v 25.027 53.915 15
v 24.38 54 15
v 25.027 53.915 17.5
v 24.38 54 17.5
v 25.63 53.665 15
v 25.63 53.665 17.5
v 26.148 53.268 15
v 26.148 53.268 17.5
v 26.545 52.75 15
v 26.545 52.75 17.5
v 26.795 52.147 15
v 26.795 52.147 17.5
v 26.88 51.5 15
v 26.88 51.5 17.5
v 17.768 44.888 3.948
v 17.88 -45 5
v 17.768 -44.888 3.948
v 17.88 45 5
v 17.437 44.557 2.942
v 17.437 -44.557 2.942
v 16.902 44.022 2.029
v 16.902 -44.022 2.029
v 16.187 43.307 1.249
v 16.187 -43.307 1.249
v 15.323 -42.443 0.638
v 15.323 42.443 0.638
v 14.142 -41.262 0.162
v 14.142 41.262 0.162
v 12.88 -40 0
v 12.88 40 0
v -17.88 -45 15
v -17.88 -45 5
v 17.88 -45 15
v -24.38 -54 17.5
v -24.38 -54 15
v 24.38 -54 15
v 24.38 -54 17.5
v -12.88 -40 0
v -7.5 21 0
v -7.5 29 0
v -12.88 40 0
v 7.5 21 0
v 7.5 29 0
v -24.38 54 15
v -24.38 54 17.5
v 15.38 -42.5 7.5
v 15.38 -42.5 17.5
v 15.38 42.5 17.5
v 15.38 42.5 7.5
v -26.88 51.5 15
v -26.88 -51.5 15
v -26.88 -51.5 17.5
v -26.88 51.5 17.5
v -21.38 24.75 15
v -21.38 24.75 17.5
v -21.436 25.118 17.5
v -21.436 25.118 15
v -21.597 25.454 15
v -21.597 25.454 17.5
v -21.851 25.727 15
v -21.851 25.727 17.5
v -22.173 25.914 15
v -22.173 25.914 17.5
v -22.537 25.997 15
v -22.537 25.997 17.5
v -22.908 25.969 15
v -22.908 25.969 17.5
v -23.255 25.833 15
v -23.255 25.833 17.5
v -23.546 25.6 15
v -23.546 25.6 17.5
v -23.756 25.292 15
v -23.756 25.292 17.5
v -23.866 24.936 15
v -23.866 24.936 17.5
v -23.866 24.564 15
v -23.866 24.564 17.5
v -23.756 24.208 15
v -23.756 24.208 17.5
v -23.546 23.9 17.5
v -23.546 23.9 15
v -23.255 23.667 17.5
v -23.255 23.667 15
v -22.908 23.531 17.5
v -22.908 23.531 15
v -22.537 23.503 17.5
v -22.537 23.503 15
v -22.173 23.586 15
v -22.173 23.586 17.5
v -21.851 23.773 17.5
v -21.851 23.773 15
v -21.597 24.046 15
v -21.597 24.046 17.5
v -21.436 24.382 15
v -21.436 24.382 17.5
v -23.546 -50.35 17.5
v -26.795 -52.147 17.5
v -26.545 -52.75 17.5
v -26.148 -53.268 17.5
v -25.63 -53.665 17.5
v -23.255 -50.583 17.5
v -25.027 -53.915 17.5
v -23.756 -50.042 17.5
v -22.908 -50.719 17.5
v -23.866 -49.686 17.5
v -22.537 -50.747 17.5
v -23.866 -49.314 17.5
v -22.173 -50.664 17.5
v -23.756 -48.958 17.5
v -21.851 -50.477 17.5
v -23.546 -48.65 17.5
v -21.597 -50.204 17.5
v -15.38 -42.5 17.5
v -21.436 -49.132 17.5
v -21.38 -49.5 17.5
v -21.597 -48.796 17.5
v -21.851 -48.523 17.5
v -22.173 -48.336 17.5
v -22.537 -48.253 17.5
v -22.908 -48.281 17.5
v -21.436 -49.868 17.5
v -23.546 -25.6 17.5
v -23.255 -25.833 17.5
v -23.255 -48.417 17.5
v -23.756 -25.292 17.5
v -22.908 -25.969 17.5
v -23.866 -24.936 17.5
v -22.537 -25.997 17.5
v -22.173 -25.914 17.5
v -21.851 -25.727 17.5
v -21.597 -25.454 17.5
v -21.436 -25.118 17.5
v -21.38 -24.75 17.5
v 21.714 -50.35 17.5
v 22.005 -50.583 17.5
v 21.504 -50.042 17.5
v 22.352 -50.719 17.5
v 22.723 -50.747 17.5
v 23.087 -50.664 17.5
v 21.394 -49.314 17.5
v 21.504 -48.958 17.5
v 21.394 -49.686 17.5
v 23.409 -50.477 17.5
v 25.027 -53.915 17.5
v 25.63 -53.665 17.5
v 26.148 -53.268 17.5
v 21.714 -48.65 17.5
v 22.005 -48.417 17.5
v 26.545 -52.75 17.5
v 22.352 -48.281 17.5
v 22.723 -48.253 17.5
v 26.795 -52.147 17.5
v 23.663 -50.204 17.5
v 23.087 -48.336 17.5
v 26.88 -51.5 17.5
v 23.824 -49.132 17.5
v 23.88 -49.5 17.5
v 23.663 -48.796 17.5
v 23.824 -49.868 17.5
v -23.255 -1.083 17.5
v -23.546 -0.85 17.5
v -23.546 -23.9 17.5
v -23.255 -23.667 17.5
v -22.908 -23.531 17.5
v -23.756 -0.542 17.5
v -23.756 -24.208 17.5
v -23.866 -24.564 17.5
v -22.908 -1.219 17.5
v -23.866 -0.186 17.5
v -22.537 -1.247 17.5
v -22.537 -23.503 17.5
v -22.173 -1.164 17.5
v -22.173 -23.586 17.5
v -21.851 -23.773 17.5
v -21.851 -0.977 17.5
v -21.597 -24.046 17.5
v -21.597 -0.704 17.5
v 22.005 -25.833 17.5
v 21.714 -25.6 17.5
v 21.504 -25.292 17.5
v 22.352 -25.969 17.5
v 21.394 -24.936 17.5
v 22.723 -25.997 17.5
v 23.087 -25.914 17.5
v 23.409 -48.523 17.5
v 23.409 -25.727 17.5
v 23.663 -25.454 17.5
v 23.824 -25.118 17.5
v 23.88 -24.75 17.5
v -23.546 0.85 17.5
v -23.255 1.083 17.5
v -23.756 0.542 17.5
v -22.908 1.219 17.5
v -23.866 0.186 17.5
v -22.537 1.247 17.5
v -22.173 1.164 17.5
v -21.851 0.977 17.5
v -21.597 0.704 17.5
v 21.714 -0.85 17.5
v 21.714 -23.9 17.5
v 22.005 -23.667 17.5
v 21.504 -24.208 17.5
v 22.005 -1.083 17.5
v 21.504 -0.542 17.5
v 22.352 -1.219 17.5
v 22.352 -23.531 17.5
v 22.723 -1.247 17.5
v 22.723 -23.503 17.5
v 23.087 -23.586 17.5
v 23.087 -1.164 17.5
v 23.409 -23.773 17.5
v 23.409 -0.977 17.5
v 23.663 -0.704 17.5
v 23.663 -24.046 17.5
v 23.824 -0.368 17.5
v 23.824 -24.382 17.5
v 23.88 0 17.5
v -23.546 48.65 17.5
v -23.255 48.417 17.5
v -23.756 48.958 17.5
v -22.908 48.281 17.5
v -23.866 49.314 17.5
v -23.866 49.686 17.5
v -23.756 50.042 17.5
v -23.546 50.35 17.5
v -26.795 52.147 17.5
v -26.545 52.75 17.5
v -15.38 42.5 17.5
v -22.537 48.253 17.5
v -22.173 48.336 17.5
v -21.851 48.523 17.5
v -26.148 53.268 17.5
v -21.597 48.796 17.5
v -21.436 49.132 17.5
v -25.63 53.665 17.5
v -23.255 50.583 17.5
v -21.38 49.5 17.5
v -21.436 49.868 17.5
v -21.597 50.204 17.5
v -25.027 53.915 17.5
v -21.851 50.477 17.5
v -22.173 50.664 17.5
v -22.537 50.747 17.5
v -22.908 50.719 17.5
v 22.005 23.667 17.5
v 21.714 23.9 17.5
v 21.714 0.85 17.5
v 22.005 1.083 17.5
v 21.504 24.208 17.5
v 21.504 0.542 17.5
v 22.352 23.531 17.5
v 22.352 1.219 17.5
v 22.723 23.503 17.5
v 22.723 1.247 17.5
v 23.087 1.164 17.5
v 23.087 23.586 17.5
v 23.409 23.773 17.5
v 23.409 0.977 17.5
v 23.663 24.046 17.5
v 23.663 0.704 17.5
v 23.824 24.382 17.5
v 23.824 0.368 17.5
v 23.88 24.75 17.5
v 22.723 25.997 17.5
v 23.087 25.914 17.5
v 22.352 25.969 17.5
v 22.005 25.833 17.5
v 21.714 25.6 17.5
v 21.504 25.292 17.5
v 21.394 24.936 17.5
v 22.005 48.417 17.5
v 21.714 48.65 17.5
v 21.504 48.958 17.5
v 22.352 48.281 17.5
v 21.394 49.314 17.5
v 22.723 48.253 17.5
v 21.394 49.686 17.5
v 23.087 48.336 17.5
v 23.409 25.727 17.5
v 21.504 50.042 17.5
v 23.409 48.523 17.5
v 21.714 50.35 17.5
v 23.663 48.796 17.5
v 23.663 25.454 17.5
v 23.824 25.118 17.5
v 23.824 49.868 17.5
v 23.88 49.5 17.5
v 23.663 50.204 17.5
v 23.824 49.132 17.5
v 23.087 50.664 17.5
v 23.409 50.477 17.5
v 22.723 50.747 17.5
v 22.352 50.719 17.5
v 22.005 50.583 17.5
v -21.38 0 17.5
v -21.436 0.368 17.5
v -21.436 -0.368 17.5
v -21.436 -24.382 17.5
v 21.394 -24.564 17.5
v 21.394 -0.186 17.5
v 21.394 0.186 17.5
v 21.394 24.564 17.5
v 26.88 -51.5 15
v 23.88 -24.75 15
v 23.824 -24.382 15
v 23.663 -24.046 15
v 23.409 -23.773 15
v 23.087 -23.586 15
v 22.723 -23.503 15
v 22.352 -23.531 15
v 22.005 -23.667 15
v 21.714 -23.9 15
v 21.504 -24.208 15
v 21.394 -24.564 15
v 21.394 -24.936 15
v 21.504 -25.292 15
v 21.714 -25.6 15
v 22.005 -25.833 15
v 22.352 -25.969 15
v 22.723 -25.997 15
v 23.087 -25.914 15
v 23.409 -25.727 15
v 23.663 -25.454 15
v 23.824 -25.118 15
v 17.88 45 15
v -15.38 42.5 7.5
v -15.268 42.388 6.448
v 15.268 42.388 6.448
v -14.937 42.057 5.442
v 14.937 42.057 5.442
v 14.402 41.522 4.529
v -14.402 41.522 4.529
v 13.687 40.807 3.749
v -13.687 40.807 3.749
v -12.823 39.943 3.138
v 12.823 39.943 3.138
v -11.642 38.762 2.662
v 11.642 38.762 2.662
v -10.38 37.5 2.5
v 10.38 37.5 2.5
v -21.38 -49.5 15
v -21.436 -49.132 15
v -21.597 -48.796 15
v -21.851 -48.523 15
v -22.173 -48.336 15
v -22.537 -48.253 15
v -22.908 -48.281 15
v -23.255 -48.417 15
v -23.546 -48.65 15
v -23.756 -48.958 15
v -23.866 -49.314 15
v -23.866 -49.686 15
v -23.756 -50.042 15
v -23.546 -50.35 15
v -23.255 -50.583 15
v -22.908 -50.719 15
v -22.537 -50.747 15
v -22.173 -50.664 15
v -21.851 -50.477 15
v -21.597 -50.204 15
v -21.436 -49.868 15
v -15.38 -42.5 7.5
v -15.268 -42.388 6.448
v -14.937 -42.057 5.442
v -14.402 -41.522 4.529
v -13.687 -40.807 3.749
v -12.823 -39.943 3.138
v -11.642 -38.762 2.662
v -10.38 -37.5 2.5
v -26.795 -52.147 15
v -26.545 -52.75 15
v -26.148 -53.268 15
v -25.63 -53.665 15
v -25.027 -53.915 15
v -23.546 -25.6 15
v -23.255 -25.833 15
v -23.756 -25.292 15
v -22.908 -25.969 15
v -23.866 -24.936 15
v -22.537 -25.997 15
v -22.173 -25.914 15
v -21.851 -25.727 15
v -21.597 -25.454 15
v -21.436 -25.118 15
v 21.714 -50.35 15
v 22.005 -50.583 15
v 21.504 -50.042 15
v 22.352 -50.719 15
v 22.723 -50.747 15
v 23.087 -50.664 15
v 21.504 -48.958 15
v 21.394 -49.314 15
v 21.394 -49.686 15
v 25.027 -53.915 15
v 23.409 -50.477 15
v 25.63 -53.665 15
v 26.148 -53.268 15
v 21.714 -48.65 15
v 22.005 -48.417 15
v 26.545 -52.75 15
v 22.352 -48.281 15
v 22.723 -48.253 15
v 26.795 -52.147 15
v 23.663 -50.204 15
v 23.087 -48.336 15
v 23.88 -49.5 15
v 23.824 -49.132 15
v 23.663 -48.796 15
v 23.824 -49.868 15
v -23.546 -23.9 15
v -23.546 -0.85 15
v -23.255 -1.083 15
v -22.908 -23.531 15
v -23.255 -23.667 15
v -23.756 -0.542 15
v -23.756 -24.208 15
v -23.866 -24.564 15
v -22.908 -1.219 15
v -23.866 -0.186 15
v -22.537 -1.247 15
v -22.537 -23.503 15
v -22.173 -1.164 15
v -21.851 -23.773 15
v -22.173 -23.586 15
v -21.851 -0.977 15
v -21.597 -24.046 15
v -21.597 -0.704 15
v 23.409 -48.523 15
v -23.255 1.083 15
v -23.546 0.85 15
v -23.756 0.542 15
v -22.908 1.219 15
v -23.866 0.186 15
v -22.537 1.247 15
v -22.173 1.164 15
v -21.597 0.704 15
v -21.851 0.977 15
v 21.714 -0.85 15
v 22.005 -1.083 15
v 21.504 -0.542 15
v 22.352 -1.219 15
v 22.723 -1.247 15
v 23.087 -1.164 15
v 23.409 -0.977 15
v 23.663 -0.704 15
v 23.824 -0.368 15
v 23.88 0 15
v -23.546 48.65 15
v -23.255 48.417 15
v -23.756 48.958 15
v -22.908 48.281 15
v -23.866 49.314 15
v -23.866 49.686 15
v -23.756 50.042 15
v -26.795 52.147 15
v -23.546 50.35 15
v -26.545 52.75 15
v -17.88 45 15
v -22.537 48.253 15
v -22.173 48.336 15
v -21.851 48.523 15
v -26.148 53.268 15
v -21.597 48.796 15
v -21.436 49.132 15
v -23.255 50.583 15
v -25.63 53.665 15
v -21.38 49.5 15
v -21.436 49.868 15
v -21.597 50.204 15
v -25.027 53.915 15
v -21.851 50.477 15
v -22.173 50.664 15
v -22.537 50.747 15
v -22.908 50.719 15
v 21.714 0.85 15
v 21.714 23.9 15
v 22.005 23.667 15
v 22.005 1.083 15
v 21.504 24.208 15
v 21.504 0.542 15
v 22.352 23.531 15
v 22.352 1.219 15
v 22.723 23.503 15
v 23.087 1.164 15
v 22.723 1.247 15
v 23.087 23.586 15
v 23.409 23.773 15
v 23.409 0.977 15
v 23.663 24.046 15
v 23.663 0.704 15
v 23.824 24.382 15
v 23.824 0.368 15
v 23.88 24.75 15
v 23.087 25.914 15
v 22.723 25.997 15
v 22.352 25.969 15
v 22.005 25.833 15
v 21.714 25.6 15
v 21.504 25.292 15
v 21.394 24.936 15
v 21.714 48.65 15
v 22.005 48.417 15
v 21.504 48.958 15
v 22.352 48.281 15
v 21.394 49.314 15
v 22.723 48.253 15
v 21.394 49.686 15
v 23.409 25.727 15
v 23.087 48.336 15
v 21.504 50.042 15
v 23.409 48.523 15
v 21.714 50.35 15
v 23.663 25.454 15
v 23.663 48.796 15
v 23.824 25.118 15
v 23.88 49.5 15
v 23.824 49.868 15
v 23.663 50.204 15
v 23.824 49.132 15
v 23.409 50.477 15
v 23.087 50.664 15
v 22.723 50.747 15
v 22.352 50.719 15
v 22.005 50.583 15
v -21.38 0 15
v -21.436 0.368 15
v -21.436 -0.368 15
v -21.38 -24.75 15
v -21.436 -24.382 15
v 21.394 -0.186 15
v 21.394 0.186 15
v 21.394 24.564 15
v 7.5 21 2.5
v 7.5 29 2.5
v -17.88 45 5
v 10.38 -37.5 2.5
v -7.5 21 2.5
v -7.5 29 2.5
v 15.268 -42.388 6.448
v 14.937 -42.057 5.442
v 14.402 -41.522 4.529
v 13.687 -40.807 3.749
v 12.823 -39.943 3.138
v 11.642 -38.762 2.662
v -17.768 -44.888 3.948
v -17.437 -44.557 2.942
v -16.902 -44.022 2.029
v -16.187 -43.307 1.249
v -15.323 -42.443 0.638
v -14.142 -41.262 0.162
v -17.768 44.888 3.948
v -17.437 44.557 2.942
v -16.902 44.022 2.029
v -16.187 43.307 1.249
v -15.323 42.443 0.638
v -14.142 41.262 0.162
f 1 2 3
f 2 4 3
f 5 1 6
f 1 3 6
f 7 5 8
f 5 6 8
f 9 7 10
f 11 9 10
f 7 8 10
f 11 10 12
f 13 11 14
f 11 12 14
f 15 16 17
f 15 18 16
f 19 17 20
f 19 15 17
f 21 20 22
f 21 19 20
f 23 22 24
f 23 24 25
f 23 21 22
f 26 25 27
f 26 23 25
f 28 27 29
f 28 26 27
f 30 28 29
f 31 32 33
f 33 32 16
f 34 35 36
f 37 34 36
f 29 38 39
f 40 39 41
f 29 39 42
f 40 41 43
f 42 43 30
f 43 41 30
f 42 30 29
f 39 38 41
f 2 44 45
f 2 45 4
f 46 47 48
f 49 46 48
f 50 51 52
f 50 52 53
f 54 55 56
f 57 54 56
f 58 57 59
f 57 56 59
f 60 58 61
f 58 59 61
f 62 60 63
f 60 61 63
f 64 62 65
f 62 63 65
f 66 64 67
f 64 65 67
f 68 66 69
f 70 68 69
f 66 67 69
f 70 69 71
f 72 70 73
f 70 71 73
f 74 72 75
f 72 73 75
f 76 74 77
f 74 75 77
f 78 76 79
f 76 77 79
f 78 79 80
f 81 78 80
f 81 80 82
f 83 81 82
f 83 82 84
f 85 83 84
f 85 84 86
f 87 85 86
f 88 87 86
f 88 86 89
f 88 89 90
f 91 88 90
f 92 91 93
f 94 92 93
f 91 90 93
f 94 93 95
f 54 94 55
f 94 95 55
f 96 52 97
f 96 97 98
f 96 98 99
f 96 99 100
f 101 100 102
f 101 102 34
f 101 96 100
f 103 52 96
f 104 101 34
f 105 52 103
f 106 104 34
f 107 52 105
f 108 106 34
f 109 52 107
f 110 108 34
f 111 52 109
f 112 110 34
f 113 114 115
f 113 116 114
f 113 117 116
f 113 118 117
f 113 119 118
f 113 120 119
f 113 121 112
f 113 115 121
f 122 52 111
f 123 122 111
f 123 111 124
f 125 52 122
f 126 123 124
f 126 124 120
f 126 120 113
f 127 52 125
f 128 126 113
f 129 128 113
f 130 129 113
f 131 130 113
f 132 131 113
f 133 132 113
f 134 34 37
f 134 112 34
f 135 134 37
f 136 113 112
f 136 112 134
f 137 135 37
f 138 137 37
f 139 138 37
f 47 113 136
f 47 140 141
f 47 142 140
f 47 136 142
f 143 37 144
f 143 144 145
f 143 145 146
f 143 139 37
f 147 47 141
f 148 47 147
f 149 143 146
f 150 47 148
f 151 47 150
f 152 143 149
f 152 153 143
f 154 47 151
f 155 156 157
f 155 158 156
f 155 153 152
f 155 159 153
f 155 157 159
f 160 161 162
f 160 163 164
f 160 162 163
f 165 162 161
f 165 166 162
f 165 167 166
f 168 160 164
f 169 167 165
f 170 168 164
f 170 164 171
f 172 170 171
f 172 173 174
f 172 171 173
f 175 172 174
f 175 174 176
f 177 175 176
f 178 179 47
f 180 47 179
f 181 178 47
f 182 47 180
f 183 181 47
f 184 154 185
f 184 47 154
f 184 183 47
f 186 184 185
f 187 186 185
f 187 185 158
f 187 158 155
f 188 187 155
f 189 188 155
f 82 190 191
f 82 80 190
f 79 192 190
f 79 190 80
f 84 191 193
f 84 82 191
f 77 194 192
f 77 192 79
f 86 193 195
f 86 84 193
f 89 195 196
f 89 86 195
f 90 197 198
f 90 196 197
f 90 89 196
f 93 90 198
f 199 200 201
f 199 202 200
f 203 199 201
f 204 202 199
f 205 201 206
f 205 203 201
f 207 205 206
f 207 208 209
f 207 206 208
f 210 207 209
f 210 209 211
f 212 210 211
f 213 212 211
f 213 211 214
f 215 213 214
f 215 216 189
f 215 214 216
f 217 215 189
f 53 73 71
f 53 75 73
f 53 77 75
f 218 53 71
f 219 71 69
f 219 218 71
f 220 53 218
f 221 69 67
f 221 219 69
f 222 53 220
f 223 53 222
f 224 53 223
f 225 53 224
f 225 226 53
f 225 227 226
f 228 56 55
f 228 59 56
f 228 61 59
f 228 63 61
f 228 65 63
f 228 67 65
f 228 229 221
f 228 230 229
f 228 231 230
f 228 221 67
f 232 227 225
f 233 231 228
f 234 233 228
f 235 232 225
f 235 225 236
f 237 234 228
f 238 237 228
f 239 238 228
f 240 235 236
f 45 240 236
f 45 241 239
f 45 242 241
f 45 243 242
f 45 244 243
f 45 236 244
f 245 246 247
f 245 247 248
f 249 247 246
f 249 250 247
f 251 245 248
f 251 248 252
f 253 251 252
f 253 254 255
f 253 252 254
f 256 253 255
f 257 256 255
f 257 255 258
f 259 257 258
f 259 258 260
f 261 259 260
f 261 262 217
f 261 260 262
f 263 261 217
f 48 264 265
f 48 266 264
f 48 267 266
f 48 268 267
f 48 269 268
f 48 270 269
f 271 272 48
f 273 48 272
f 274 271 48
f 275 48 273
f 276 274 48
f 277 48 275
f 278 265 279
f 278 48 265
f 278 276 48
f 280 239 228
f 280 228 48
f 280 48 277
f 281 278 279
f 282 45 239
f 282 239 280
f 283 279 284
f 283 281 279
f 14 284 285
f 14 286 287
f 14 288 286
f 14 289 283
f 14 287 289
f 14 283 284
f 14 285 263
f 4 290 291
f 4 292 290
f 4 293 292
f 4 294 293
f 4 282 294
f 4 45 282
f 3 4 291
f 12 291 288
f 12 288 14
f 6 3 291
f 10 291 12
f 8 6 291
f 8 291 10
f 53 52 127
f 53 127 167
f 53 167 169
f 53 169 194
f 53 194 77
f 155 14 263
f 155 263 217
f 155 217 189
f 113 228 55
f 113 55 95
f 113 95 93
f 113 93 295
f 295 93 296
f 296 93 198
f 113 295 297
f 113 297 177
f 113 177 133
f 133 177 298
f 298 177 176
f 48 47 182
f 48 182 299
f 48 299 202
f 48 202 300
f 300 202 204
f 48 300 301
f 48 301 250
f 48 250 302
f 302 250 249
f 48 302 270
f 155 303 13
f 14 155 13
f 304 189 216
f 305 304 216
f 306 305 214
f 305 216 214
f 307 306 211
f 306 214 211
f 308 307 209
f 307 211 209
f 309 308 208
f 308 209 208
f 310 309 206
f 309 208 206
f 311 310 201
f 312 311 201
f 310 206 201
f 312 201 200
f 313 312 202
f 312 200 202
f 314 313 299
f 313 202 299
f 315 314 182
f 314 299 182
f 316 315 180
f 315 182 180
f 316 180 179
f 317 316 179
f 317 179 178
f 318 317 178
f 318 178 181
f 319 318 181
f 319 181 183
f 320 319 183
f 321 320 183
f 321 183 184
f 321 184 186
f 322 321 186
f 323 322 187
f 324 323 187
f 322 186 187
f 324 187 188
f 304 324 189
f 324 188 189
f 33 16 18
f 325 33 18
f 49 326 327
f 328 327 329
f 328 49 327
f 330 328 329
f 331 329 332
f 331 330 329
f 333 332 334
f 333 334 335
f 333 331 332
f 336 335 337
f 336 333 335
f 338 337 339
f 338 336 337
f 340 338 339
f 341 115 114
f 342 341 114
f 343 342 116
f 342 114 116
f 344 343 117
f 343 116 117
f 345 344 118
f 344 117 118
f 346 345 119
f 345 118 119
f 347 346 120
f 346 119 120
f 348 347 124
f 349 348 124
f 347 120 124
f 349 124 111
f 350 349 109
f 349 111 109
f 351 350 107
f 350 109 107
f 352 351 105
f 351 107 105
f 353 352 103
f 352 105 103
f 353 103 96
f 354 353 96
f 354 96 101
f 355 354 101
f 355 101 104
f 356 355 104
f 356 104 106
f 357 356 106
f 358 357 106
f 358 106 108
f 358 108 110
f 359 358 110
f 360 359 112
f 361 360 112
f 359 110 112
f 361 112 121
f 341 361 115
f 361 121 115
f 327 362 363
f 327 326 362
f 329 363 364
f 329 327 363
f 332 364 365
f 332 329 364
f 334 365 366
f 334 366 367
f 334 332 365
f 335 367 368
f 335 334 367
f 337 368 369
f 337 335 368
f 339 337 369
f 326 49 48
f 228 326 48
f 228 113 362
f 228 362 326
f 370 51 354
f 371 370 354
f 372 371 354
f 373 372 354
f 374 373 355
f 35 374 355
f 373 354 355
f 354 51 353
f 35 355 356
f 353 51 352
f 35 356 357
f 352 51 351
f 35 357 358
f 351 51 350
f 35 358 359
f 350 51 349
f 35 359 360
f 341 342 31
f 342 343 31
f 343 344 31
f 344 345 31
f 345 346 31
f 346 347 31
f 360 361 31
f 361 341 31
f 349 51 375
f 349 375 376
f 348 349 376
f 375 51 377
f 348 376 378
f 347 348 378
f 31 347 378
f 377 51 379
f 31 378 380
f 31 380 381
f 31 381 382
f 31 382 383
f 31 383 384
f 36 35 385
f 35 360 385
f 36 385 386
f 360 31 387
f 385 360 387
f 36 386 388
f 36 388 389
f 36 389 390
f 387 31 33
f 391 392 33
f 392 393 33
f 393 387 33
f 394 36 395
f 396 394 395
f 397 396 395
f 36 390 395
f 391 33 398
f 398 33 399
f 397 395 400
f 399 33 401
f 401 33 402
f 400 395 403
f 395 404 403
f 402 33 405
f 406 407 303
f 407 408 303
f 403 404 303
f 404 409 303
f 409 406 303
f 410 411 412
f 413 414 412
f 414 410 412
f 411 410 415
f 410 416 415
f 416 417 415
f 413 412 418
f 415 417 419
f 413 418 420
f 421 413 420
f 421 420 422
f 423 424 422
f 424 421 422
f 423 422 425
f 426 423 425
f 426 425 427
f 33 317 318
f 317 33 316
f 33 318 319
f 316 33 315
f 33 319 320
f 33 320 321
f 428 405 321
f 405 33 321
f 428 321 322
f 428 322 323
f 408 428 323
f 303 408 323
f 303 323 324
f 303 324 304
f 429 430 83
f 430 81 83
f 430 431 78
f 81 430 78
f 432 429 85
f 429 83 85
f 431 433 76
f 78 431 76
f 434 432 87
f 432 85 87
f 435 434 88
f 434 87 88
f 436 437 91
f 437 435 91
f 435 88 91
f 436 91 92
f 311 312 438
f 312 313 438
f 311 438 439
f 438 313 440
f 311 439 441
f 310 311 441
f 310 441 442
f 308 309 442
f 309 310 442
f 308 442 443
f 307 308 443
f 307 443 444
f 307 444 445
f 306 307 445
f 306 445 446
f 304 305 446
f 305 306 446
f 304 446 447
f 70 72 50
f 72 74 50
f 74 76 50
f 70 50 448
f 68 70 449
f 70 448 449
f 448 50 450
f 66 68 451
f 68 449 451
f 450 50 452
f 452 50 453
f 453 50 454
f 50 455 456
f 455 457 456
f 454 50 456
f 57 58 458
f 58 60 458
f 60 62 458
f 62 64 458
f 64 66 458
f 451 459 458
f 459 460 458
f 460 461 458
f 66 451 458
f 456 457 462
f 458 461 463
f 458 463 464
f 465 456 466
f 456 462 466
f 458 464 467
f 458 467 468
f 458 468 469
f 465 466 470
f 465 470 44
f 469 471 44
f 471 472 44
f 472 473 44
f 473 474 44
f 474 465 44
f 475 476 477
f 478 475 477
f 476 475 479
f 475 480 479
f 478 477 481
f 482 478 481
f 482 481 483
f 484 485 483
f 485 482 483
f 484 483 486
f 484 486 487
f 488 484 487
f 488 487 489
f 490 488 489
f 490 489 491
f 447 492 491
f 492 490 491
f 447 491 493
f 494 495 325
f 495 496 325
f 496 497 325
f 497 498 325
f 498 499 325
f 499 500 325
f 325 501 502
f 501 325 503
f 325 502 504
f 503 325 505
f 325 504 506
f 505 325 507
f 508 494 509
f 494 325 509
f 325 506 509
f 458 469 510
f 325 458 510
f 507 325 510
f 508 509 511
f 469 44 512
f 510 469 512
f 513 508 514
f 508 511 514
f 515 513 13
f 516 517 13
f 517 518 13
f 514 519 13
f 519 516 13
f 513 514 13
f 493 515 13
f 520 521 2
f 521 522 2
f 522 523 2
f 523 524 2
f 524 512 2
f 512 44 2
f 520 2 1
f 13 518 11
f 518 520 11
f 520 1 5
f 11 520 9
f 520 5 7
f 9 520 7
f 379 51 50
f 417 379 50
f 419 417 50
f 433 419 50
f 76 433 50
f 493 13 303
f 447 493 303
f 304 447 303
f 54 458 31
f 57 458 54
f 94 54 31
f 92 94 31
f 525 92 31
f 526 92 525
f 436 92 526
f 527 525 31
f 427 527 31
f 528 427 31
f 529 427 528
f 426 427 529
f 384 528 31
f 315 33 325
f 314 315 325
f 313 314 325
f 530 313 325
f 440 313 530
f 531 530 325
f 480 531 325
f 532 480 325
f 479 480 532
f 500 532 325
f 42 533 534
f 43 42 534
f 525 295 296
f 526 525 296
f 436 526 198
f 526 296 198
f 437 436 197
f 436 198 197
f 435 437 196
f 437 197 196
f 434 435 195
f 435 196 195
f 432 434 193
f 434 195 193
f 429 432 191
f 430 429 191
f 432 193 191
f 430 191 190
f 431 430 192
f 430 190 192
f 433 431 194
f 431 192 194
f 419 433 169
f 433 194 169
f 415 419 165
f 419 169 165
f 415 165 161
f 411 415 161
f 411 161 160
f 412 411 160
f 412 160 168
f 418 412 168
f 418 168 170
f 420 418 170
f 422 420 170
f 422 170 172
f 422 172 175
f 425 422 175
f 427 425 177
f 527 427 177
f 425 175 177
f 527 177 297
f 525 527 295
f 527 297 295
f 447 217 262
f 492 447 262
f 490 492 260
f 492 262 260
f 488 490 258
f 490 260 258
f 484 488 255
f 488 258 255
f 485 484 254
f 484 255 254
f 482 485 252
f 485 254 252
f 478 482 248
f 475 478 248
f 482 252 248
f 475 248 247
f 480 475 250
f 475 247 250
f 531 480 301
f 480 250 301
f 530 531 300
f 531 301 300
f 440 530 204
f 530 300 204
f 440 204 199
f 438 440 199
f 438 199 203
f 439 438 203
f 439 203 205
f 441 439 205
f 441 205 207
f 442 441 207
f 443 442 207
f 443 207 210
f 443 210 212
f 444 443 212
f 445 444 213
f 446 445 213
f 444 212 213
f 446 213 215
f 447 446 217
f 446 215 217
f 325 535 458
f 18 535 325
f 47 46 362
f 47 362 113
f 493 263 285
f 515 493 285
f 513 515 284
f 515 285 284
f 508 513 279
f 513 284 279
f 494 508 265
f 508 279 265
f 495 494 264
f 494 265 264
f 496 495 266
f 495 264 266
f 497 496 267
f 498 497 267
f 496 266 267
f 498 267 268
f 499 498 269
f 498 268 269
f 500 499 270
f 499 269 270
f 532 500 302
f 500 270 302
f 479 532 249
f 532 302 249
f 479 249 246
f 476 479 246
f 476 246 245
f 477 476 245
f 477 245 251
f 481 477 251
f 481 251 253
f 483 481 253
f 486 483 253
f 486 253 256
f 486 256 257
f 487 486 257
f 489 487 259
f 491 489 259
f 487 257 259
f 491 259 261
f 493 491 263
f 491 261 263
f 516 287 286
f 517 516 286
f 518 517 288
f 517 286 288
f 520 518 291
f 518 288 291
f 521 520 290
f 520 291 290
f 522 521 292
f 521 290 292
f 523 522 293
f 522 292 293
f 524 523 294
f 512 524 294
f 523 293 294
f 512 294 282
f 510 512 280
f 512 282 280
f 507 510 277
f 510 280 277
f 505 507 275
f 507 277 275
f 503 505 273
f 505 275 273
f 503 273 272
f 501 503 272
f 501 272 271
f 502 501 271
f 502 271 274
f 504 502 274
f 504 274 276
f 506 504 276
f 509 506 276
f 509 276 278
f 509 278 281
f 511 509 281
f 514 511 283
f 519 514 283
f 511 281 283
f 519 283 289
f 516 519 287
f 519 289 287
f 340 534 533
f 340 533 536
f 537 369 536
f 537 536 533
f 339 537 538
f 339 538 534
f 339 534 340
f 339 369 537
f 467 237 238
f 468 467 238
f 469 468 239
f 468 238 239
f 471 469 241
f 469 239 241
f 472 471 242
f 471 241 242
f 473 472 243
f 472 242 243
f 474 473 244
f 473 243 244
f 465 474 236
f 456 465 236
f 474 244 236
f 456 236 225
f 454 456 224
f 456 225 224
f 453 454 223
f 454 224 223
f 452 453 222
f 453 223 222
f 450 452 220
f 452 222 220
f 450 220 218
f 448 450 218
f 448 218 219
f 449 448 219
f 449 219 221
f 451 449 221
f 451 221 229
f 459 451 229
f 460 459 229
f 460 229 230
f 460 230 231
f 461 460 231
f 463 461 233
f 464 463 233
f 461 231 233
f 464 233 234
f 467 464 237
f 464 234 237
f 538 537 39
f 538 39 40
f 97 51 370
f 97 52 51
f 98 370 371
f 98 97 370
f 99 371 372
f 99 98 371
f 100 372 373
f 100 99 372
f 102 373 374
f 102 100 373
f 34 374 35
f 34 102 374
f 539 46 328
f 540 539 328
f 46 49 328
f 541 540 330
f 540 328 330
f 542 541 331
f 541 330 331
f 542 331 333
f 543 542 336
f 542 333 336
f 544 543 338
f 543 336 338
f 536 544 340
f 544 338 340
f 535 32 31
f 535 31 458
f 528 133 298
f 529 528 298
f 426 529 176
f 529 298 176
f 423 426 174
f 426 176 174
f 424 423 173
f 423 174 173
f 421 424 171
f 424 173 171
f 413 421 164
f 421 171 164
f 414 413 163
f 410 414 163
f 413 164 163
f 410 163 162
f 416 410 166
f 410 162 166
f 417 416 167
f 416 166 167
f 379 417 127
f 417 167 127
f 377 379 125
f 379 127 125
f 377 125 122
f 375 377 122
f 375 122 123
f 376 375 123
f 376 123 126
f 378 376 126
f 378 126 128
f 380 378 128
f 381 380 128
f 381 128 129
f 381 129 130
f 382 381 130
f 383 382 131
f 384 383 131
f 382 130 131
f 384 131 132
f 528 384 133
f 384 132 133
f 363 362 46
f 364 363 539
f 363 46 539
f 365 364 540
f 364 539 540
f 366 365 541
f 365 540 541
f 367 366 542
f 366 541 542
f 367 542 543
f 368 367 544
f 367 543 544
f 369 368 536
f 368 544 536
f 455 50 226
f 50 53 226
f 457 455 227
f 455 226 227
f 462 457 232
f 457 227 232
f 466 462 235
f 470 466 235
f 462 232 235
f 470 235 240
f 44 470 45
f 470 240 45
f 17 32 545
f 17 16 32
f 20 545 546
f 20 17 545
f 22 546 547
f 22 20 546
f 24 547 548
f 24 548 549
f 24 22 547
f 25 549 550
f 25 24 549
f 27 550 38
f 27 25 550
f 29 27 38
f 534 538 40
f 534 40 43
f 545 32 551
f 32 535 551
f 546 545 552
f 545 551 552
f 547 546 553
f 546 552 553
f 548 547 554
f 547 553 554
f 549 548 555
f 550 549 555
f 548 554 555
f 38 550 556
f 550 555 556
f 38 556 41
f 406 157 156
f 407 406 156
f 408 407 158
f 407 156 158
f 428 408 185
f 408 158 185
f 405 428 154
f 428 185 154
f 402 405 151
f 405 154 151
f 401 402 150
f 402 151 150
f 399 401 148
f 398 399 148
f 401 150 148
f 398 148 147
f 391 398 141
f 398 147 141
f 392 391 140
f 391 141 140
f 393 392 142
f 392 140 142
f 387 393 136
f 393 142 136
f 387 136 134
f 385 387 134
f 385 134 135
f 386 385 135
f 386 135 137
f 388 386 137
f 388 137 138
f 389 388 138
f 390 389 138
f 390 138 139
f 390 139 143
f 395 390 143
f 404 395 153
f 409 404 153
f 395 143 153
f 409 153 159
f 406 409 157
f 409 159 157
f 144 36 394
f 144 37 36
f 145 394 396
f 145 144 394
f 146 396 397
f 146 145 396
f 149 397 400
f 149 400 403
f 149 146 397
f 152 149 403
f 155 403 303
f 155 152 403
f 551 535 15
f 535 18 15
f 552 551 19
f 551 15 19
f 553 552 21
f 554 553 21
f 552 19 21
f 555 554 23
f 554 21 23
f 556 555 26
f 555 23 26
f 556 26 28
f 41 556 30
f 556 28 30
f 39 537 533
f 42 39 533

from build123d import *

# Parameters (mm, degrees)
SKETCH1_W           = 35.76
SKETCH1_H           = 90
BOSS_EXTRUDE1_DEPTH = 15
SKETCH2_W           = 53.76
SKETCH2_H           = 108
BOSS_EXTRUDE2_DEPTH = 2.5
SHELL1_START        = -15.38
SHELL1_OUTLINE_W    = 85
SHELL1_OUTLINE_H    = 15
SHELL1_DEPTH        = 30.76
FILLET1_R           = 2.5
FILLET2_R           = 5
SKETCH3_W           = 15
SKETCH3_H           = 8
CUT_EXTRUDE1_DEPTH  = 63.15733585
SKETCH4_R           = 1.25
CUT_EXTRUDE2_DEPTH  = 2.5


# Read off the part's stored shape, not the designer's step: Shell1
with BuildPart() as part:
    # Sketch1 → Boss-Extrude1 (new body)
    with BuildSketch(Plane.XY):
        Rectangle(SKETCH1_W, SKETCH1_H)
    extrude(amount=BOSS_EXTRUDE1_DEPTH)

    # Sketch2 → Boss-Extrude2 (add)
    with BuildSketch(Plane.XY.offset(15)):
        Rectangle(SKETCH2_W, SKETCH2_H)
    extrude(amount=BOSS_EXTRUDE2_DEPTH)

    # Shell1 outline → Shell1 (cut)
    with BuildSketch(Plane.YZ.offset(SHELL1_START)):
        with Locations((0, 10)):
            Rectangle(SHELL1_OUTLINE_W, SHELL1_OUTLINE_H)
    extrude(amount=SHELL1_DEPTH, mode=Mode.SUBTRACT)

    # Fillet1
    fillet1_edges = [part.edges().sort_by_distance(p)[0] for p in [
        (26.88, -54, 16.25),
        (26.88, 54, 16.25),
        (-26.88, 54, 16.25),
        (-26.88, -54, 16.25),
    ]]
    fillet(fillet1_edges, radius=FILLET1_R)

    # Fillet2
    fillet2_edges = [part.edges().sort_by_distance(p)[0] for p in [
        (15.38, 0, 2.5),
        (0, 42.5, 2.5),
        (-15.38, 0, 2.5),
        (0, -42.5, 2.5),
        (0, -45, 0),
        (-17.88, 0, 0),
        (0, 45, 0),
        (17.88, 0, 0),
    ]]
    fillet(fillet2_edges, radius=FILLET2_R)

    # Sketch3 → Cut-Extrude1 (cut, through all)
    with BuildSketch(Plane.XY.offset(2.5)):
        with Locations((0, 25)):
            Rectangle(SKETCH3_W, SKETCH3_H)
    extrude(amount=-CUT_EXTRUDE1_DEPTH, mode=Mode.SUBTRACT)

    # Sketch4 → Cut-Extrude2 (cut)
    with BuildSketch(Plane.XY.offset(17.5)):
        with Locations((-22.63, 49.5)):
            Circle(SKETCH4_R)
        with Locations((22.63, 49.5)):
            Circle(SKETCH4_R)
        with Locations((22.63, 24.75)):
            Circle(SKETCH4_R)
        with Locations((22.63, 0)):
            Circle(SKETCH4_R)
        with Locations((22.63, -24.75)):
            Circle(SKETCH4_R)
        with Locations((22.63, -49.5)):
            Circle(SKETCH4_R)
        with Locations((-22.63, 24.75)):
            Circle(SKETCH4_R)
        with Locations((-22.63, 0)):
            Circle(SKETCH4_R)
        with Locations((-22.63, -24.75)):
            Circle(SKETCH4_R)
        with Locations((-22.63, -49.5)):
            Circle(SKETCH4_R)
    extrude(amount=-CUT_EXTRUDE2_DEPTH, mode=Mode.SUBTRACT)


solid = part.part
